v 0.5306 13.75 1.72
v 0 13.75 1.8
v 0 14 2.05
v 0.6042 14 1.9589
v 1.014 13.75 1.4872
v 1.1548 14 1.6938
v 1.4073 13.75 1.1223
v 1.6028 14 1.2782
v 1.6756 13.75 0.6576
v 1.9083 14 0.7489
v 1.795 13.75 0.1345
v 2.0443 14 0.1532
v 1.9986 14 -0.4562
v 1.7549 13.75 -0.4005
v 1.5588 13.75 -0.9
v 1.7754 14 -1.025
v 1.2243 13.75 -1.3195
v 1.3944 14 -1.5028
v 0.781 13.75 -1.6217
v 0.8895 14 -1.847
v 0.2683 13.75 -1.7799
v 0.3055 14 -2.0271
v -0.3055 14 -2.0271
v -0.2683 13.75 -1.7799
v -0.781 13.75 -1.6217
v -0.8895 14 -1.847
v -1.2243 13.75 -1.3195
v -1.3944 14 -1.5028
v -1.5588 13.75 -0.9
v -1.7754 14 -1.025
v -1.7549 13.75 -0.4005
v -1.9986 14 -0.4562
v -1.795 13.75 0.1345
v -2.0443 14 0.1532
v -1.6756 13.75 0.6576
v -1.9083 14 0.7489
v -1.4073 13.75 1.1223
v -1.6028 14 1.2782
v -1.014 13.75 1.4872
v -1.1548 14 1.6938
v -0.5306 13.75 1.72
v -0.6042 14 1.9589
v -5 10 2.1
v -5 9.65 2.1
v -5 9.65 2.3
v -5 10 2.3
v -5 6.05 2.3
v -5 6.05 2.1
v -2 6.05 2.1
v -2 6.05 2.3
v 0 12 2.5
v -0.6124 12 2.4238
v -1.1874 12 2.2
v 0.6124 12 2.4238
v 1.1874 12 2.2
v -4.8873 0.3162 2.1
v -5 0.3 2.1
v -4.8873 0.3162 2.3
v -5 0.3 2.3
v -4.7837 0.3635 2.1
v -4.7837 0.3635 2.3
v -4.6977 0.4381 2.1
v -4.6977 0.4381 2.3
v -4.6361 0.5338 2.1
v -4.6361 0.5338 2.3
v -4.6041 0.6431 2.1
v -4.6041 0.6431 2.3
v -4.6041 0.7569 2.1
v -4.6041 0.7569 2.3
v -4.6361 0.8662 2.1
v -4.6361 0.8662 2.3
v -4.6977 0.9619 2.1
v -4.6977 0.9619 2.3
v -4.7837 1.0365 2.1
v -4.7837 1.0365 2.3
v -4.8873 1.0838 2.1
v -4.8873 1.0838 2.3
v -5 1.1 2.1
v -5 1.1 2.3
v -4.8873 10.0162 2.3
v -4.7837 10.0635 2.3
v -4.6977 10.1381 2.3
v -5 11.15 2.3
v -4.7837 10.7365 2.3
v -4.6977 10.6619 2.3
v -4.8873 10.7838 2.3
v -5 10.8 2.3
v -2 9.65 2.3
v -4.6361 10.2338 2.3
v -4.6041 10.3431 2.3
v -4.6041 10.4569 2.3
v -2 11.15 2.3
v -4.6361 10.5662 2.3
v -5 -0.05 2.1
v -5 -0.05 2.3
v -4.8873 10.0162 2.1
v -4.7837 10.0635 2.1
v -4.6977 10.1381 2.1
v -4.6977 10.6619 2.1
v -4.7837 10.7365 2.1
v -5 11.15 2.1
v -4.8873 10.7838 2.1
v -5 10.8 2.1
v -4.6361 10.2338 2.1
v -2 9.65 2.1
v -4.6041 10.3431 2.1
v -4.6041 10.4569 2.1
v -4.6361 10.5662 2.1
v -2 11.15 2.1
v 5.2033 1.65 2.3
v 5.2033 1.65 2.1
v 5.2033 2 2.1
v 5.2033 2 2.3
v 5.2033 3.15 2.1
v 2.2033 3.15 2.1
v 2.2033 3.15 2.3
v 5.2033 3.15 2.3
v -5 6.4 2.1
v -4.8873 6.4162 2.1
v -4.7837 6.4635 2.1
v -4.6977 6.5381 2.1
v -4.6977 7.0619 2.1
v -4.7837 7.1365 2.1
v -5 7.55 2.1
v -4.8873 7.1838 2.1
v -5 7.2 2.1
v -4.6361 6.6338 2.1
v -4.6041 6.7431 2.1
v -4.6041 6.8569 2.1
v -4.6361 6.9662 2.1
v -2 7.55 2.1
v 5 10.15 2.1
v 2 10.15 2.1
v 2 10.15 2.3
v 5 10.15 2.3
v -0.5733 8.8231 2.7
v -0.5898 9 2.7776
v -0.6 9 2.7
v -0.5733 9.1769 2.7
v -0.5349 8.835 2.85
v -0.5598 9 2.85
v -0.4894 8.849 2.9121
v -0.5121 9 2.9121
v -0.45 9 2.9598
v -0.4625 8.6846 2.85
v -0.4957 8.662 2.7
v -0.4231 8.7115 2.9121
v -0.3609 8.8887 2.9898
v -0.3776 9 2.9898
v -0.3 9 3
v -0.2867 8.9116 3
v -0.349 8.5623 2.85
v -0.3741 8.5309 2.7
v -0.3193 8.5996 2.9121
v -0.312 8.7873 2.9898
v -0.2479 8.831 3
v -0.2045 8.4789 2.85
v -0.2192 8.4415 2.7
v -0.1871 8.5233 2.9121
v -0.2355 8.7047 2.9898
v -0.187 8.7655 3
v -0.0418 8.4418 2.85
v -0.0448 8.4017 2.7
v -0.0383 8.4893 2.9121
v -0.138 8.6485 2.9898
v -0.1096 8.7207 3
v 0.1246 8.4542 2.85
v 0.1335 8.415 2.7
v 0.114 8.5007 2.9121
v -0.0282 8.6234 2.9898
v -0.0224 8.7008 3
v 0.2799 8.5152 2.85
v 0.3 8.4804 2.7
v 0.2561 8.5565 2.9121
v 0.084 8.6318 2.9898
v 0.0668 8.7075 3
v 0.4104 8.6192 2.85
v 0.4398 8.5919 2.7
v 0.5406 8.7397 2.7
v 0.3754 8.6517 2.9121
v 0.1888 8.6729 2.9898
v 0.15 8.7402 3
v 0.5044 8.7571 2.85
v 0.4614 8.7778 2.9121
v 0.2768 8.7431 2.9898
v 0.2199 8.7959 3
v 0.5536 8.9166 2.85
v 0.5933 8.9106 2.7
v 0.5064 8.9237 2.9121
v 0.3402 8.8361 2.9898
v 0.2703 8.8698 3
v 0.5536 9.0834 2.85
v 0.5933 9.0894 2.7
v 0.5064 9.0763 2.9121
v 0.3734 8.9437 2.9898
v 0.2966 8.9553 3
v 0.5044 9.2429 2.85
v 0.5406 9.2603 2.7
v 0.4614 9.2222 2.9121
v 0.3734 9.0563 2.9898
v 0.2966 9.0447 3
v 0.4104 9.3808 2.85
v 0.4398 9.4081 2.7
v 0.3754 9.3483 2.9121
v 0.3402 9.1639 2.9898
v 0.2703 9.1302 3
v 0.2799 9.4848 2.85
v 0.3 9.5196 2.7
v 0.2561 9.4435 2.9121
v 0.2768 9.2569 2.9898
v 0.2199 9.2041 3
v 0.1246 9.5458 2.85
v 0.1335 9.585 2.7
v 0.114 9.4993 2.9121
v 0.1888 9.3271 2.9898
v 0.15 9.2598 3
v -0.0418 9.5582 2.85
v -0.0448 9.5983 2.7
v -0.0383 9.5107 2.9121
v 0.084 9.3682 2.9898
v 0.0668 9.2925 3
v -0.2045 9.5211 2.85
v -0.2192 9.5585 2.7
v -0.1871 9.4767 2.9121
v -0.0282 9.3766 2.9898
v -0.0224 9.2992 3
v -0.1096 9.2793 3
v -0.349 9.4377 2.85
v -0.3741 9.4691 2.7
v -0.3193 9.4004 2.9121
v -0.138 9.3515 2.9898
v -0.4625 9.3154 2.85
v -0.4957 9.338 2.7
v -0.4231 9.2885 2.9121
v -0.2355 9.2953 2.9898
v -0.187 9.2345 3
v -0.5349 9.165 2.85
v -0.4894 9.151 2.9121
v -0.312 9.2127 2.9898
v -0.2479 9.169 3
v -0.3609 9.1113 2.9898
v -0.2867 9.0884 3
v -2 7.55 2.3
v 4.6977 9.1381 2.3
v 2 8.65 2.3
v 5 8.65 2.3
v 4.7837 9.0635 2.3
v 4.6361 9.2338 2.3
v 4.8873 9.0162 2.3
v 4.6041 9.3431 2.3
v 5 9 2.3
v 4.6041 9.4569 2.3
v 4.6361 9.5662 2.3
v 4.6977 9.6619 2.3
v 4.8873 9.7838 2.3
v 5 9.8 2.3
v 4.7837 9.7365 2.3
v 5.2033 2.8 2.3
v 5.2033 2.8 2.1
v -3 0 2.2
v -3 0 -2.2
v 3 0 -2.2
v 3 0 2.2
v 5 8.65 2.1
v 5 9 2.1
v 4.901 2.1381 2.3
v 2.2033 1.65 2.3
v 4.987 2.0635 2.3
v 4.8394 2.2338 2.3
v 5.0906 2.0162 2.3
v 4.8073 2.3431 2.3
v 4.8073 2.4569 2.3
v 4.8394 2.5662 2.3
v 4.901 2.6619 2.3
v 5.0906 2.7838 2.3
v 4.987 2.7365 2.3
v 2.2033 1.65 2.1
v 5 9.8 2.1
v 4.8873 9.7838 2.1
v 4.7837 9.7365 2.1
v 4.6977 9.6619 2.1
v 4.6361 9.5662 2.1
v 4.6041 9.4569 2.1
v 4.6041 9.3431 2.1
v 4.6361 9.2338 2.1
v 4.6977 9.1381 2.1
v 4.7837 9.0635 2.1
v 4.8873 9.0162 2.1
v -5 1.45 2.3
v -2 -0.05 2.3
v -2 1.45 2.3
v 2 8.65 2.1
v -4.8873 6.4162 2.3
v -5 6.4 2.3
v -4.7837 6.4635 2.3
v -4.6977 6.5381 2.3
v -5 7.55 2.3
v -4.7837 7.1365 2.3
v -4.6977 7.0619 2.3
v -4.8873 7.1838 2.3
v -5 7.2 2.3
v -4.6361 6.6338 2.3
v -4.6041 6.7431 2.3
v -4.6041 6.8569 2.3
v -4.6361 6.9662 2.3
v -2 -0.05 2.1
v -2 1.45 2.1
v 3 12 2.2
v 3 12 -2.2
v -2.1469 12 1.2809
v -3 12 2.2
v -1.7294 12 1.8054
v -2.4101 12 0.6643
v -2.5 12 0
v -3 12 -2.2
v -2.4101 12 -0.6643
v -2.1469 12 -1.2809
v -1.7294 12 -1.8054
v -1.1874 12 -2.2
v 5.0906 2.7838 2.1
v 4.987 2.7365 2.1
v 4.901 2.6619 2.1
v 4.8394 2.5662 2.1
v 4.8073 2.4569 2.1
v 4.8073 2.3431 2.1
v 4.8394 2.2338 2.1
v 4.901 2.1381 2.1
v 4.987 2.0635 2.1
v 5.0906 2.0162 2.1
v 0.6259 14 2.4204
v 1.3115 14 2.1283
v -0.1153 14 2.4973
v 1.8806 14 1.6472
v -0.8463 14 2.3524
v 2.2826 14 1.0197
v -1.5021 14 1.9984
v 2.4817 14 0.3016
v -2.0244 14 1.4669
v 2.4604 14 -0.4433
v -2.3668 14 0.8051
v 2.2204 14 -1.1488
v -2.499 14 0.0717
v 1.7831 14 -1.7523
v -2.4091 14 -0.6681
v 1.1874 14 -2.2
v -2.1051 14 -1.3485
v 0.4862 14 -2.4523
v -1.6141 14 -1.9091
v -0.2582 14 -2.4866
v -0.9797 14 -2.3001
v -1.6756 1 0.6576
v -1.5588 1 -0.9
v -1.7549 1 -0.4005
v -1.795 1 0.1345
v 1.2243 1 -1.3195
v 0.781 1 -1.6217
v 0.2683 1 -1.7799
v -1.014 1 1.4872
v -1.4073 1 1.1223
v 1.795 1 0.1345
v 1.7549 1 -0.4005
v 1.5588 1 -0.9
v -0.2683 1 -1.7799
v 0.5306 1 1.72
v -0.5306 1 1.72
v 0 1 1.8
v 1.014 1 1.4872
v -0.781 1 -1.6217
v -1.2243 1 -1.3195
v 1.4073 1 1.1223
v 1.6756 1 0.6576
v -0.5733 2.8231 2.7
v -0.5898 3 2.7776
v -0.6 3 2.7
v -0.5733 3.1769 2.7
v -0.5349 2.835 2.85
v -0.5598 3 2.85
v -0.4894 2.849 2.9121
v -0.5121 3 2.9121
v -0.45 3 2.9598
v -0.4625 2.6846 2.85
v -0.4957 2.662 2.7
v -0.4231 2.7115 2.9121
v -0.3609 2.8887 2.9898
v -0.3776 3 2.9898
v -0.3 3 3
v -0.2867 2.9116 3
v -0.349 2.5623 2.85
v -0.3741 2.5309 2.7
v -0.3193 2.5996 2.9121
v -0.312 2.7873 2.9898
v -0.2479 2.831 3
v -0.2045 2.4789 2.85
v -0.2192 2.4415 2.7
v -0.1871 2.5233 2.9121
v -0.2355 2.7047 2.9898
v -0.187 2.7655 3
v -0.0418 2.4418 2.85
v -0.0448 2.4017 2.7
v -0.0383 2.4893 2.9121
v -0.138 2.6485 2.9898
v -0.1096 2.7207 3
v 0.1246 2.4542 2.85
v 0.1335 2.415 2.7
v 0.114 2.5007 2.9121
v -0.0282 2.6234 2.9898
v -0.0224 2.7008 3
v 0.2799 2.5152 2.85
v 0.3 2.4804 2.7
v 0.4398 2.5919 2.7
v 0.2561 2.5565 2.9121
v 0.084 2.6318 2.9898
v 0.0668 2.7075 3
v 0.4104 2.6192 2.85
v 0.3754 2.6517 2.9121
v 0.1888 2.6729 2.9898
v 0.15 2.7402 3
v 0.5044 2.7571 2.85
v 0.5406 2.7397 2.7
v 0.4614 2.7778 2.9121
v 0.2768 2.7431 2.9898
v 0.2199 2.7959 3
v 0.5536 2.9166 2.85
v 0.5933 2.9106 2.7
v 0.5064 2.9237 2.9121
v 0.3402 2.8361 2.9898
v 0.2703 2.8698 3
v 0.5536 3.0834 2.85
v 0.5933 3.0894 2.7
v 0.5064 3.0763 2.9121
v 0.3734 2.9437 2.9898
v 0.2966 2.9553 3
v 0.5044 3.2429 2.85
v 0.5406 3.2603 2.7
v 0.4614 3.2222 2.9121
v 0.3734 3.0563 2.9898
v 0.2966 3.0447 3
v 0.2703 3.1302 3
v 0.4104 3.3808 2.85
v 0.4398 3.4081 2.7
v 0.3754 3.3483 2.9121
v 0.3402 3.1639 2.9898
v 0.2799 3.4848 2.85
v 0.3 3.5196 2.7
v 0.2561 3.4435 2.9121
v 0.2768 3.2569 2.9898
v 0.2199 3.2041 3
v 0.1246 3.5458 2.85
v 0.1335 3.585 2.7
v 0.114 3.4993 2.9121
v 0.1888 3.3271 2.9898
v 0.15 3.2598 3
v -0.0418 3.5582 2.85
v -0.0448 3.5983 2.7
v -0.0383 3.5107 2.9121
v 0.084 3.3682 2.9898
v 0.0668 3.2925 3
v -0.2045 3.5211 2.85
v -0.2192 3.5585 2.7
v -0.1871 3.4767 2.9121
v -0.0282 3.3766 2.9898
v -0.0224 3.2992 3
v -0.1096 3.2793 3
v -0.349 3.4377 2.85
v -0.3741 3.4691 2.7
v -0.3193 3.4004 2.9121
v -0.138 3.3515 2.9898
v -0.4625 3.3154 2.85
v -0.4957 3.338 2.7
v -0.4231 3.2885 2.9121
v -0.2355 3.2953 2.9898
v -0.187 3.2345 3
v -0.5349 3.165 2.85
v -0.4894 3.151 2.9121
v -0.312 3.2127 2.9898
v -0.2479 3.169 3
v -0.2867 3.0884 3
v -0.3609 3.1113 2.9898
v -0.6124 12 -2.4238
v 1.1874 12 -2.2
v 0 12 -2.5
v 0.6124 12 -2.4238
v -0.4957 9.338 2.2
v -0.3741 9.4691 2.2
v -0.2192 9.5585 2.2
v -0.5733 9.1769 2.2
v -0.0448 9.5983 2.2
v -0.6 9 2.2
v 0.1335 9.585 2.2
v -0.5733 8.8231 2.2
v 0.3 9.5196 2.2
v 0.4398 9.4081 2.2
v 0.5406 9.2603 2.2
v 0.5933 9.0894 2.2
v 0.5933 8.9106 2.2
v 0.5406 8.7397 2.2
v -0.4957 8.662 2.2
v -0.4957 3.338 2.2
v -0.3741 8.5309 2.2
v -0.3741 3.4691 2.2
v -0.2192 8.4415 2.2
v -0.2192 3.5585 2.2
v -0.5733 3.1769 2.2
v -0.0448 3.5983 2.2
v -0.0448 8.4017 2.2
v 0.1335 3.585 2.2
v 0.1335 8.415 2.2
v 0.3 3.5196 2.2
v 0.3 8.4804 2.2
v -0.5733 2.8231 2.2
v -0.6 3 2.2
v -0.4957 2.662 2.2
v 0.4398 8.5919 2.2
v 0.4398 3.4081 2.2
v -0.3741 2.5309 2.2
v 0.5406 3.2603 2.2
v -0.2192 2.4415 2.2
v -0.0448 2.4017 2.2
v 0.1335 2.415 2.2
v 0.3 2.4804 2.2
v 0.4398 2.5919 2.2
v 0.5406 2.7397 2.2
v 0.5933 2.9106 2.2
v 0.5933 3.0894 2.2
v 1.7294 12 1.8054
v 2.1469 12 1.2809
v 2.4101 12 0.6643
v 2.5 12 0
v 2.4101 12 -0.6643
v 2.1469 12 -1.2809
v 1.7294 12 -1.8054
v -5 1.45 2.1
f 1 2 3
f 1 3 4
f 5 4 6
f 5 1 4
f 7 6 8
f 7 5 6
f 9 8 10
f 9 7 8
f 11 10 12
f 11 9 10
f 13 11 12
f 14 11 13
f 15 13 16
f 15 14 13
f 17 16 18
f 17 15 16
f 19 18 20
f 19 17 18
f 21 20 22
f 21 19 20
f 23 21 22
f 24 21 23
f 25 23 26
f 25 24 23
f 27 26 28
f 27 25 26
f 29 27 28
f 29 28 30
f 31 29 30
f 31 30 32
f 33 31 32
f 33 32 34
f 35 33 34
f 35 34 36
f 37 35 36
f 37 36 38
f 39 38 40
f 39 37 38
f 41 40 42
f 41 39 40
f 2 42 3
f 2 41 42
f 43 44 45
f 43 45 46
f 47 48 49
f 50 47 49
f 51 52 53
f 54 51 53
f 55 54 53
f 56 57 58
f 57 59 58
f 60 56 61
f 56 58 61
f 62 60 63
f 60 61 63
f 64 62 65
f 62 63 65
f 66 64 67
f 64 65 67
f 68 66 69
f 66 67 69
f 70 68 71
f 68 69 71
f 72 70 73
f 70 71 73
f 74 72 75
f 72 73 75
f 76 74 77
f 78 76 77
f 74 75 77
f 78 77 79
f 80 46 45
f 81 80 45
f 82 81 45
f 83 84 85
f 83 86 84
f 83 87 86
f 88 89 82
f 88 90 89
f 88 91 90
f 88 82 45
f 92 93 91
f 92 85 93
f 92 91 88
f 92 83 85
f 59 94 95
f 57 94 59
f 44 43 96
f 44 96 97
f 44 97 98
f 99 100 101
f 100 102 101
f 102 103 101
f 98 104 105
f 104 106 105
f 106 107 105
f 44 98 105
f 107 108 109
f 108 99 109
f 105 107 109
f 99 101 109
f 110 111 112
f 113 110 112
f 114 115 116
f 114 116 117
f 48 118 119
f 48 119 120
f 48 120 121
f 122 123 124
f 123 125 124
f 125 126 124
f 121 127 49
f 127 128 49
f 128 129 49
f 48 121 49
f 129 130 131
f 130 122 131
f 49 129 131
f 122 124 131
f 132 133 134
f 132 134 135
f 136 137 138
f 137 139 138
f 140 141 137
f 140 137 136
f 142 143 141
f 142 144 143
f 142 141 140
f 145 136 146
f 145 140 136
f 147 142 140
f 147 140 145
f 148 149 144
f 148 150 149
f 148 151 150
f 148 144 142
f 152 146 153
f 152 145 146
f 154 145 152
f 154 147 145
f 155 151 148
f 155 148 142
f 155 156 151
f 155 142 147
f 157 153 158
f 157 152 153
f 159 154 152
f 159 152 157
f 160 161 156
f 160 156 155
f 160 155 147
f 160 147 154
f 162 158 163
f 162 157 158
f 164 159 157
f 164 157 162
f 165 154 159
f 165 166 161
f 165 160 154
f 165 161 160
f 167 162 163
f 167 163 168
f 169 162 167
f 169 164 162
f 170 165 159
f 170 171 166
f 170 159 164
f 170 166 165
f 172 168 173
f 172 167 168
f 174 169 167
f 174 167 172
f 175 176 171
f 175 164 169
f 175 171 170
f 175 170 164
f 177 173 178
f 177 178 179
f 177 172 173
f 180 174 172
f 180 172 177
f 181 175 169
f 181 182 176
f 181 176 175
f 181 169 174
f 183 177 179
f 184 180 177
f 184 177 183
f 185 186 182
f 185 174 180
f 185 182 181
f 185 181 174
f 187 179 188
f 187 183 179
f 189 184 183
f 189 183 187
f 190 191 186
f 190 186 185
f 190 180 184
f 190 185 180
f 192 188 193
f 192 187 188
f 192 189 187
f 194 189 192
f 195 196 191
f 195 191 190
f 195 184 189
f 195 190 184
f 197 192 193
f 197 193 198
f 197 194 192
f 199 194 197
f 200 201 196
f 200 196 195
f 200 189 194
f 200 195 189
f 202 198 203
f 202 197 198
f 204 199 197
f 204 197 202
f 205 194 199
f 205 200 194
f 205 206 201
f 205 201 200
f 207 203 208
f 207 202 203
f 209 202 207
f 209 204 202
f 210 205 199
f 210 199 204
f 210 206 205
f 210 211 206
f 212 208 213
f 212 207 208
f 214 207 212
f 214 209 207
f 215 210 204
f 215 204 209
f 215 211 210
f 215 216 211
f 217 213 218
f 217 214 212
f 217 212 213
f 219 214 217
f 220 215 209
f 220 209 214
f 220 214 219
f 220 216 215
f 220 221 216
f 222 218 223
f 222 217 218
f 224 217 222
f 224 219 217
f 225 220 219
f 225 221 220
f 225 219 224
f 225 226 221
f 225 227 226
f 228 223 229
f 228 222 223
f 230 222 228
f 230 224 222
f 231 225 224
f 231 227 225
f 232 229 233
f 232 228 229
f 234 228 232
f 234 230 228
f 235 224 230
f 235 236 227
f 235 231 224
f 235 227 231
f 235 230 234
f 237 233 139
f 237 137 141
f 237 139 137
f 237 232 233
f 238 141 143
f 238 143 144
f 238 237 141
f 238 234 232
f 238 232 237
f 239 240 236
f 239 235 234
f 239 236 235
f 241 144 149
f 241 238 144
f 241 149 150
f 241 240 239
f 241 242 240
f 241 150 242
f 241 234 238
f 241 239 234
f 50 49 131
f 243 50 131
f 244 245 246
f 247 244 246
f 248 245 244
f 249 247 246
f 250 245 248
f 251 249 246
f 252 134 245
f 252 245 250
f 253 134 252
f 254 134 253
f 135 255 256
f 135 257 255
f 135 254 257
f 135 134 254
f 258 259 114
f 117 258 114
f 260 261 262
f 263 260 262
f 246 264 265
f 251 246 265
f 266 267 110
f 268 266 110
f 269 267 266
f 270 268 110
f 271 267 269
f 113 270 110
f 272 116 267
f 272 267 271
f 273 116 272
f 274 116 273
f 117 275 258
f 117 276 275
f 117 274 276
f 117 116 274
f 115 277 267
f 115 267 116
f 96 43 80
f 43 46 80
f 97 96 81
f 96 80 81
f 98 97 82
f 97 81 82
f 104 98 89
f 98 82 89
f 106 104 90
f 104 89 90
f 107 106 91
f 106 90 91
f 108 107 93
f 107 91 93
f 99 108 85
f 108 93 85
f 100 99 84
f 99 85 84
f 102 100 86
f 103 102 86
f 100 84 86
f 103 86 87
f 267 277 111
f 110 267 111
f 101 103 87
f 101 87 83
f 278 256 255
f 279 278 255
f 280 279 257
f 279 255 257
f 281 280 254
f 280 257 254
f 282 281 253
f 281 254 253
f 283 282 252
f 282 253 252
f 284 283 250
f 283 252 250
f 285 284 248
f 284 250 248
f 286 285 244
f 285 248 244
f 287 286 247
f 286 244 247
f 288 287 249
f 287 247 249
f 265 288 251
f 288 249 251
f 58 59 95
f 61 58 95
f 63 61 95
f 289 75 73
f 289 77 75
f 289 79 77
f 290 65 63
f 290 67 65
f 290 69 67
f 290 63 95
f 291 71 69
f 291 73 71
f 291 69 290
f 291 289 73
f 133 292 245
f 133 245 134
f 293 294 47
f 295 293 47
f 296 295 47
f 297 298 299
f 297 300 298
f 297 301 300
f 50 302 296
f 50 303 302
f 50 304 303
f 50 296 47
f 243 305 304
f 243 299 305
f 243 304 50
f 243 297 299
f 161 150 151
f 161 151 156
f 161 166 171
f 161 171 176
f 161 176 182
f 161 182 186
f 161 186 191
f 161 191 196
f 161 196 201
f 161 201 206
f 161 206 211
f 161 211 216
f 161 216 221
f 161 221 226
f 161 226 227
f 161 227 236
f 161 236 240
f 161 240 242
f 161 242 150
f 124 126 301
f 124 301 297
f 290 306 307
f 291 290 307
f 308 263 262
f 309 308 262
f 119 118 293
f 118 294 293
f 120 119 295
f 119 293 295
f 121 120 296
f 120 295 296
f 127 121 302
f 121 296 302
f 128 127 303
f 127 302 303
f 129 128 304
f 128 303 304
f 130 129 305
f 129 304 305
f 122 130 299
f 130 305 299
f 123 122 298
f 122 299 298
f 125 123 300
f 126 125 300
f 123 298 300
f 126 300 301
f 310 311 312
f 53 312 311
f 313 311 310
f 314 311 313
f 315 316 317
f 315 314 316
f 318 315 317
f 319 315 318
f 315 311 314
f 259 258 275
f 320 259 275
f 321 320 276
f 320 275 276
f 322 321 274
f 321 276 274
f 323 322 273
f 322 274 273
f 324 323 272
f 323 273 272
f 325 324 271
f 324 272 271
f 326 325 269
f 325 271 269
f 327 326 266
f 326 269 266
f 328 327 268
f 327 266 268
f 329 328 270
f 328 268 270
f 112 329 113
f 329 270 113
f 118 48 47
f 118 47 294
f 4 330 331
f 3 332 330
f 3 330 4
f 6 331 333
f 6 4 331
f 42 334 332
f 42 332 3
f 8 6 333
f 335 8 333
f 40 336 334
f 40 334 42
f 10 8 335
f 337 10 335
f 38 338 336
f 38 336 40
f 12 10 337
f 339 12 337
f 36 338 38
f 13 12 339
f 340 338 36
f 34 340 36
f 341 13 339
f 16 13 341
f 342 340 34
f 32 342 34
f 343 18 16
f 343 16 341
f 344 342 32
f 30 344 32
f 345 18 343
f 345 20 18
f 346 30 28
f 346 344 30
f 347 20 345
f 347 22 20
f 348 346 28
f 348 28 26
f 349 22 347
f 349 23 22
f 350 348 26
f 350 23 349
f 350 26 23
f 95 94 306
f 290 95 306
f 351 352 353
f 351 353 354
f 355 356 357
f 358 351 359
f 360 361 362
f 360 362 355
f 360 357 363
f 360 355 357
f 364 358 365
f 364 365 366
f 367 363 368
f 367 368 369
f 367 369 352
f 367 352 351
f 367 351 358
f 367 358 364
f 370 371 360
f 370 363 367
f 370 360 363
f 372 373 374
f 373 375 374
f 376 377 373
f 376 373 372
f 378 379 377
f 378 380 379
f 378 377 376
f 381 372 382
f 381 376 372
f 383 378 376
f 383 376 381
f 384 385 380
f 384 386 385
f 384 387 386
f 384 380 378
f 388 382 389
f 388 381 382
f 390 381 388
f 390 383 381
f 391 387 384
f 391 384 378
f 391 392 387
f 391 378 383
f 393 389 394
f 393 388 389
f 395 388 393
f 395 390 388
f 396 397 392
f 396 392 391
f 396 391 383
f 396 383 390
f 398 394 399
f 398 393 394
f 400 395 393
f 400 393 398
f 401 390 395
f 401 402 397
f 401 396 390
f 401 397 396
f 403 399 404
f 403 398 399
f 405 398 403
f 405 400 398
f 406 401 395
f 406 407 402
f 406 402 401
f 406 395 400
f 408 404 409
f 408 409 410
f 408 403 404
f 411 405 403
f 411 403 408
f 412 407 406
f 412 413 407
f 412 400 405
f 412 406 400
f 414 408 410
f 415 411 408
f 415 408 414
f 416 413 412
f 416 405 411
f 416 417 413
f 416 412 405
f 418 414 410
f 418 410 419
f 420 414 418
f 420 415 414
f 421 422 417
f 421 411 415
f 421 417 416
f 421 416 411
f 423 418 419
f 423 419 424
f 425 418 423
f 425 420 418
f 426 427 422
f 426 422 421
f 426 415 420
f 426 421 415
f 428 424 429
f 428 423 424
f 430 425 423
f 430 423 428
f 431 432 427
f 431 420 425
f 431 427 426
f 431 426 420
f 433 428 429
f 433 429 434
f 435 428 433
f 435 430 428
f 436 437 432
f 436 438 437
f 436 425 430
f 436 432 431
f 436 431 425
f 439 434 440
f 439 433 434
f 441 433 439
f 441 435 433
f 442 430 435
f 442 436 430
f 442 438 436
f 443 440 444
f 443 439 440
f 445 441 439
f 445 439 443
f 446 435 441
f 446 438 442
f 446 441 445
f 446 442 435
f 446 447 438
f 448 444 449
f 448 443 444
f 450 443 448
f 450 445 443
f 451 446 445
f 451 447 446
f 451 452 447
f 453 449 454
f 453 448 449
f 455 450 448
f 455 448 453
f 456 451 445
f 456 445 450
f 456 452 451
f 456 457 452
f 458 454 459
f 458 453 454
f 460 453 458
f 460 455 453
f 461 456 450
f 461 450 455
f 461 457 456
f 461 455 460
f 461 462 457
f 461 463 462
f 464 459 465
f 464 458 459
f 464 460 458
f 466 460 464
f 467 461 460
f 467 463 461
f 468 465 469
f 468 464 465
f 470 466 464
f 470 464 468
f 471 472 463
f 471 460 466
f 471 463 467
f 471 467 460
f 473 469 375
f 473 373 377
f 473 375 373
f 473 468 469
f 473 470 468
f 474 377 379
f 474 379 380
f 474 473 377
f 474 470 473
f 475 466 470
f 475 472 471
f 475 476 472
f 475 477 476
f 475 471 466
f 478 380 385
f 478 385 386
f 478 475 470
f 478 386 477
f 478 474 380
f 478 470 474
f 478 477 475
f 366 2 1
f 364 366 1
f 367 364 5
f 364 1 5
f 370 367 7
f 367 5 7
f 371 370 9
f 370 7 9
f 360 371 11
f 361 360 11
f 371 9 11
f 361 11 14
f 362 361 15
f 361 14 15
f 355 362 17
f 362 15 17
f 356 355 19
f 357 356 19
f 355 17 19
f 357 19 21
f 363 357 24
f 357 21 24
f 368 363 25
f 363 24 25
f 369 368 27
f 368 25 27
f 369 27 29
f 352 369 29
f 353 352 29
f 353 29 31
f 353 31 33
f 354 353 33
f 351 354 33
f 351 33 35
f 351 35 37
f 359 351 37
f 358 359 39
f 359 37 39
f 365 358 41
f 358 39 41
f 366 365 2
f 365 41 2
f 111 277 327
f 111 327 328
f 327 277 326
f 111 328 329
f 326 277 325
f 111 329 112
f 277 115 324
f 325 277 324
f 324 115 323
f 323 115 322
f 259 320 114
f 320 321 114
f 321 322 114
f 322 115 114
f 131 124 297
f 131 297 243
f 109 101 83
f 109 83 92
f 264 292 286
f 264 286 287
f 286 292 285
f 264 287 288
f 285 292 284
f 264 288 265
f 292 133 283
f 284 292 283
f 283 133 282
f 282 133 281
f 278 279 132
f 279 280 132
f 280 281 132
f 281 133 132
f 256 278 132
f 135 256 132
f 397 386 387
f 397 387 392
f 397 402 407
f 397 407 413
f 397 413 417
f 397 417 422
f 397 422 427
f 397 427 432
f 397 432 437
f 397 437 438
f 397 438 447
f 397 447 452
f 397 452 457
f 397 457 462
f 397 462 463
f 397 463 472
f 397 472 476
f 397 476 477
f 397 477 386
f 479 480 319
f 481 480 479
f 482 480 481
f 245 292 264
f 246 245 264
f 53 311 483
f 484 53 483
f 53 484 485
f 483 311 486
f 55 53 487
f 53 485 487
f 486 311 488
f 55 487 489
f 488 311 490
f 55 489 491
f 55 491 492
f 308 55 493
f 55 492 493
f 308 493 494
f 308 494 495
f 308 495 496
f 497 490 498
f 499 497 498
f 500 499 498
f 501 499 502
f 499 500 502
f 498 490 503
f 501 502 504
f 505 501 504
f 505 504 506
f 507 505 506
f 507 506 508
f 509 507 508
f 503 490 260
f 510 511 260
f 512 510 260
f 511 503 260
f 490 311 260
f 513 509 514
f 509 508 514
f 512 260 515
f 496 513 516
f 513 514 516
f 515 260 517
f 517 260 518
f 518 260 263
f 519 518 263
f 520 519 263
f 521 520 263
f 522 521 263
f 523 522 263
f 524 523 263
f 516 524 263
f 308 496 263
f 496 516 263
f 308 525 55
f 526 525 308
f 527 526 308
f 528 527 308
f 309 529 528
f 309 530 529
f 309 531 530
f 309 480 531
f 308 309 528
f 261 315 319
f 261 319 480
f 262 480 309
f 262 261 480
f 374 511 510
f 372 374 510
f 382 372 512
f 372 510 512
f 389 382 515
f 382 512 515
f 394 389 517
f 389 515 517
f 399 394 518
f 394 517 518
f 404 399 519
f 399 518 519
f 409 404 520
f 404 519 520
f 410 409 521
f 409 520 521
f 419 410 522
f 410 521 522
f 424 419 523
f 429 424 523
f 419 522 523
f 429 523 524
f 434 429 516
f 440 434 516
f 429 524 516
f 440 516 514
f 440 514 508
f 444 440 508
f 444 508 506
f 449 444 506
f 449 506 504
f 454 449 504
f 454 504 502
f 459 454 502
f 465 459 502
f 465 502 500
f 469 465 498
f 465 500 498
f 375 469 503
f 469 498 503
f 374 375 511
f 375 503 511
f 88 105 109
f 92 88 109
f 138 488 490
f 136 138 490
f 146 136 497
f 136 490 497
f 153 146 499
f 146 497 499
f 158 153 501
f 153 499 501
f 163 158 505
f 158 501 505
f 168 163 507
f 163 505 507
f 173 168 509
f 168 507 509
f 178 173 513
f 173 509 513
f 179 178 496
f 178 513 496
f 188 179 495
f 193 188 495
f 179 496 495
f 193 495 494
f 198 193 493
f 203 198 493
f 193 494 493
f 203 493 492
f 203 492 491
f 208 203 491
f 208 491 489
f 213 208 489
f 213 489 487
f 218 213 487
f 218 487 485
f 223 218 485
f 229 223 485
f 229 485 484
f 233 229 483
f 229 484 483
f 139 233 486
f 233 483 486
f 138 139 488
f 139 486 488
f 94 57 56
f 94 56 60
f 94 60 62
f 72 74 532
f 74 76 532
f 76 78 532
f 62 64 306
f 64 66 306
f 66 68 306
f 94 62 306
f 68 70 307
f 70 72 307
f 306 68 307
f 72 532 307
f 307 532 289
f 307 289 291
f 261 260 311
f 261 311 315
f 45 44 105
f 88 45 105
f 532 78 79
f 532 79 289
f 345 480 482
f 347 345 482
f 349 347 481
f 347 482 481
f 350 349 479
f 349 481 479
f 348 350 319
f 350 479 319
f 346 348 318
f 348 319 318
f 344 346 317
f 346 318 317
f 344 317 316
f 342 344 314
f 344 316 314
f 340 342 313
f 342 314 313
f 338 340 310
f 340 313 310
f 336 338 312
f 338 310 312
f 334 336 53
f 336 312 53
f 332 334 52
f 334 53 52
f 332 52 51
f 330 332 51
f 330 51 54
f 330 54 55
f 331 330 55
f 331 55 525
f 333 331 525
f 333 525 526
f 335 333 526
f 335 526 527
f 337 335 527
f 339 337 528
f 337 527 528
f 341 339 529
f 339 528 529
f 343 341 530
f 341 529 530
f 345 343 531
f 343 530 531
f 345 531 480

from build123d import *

# Parameters (mm, degrees)
SKETCH_1_W             = 6
SKETCH_1_H             = 4.4
EXTRUDE_1_DEPTH        = 12
SKETCH_2_R             = 2.5
EXTRUDE_2_DEPTH        = 2
SKETCH_3_R             = 1.8
CUT_EXTRUDE_1_DEPTH    = 13
EXTRUDE_3_DEPTH        = 0.1
EXTRUDE_3_DEPTH_BACK   = 0.1
SKETCH_5_W             = 3
SKETCH_5_H             = 1.5
EXTRUDE_3_2_DEPTH      = 0.1
EXTRUDE_3_2_DEPTH_BACK = 0.1
EXTRUDE_3_3_DEPTH      = 0.1
EXTRUDE_3_3_DEPTH_BACK = 0.1
EXTRUDE_3_4_DEPTH      = 0.1
EXTRUDE_3_4_DEPTH_BACK = 0.1
EXTRUDE_3_5_DEPTH      = 0.1
EXTRUDE_3_5_DEPTH_BACK = 0.1
SKETCH_6_R             = 0.4
CUT_EXTRUDE_2_DEPTH    = 0.2
CHAMFER_1_SIZE         = 0.25
SKETCH_7_R             = 0.6
EXTRUDE_4_DEPTH        = 0.8
FILLET_1_R             = 0.3


with BuildPart() as part:
    # 草图1 → 凸台-拉伸1 (new body)
    with BuildSketch(Plane(origin=(0, 0, 0), x_dir=(1, 0, 0), z_dir=(0, 1, 0))):
        Rectangle(SKETCH_1_W, SKETCH_1_H)
    extrude(amount=EXTRUDE_1_DEPTH)

    # 草图2 → 凸台-拉伸2 (add)
    with BuildSketch(Plane(origin=(0, 12, 0), x_dir=(1, 0, 0), z_dir=(0, 1, 0))):
        with Locations(Location((0, 0, 0), (0, 0, 61.642363424))):
            Circle(SKETCH_2_R)
    extrude(amount=EXTRUDE_2_DEPTH)

    # 草图3 → 切除-拉伸1 (cut)
    with BuildSketch(Plane(origin=(0, 14, 0), x_dir=(1, 0, 0), z_dir=(0, 1, 0))):
        with Locations(Location((0, 0, 0), (0, 0, 270))):
            Circle(SKETCH_3_R)
    extrude(amount=-CUT_EXTRUDE_1_DEPTH, mode=Mode.SUBTRACT)

    # 倒角1
    chamfer_1_edges = [part.edges().sort_by_distance(p)[0] for p in [
        (0, 14, -1.8),
    ]]
    chamfer(chamfer_1_edges, length=CHAMFER_1_SIZE)

    # 草图7 → 凸台-拉伸4 (add)
    with BuildSketch(Plane.XY.offset(2.2)):
        with Locations(Location((0, 9, 0), (0, 0, 180))):
            Circle(SKETCH_7_R)
        with Locations(Location((0, 3, 0), (0, 0, 180))):
            Circle(SKETCH_7_R)
    extrude(amount=EXTRUDE_4_DEPTH)

    # 圆角1
    fillet_1_edges = [part.edges().sort_by_distance(p)[0] for p in [
        (0.6, 9, 3),
        (0.6, 3, 3),
    ]]
    fillet(fillet_1_edges, radius=FILLET_1_R)


with BuildPart() as body_2:
    # 草图5 → 凸台-拉伸3 (new, two sides: drawn at the far end of the back side and taken through both)
    with BuildSketch(Plane.XY.offset(2.2).offset(-EXTRUDE_3_DEPTH_BACK)):
        with Locations((-3.5, 10.4)):
            Rectangle(SKETCH_5_W, SKETCH_5_H)
    extrude(amount=EXTRUDE_3_DEPTH + EXTRUDE_3_DEPTH_BACK)


with BuildPart() as body_3:
    # 草图5 → Extrude 3 2 (new, two sides: drawn at the far end of the back side and taken through both)
    with BuildSketch(Plane.XY.offset(2.2).offset(-EXTRUDE_3_2_DEPTH_BACK)):
        with Locations((-3.5, 6.8)):
            Rectangle(SKETCH_5_W, SKETCH_5_H)
    extrude(amount=EXTRUDE_3_2_DEPTH + EXTRUDE_3_2_DEPTH_BACK)


with BuildPart() as body_4:
    # 草图5 → Extrude 3 3 (new, two sides: drawn at the far end of the back side and taken through both)
    with BuildSketch(Plane.XY.offset(2.2).offset(-EXTRUDE_3_3_DEPTH_BACK)):
        with Locations((-3.5, 0.7)):
            Rectangle(SKETCH_5_W, SKETCH_5_H)
    extrude(amount=EXTRUDE_3_3_DEPTH + EXTRUDE_3_3_DEPTH_BACK)


with BuildPart() as body_5:
    # 草图5 → Extrude 3 4 (new, two sides: drawn at the far end of the back side and taken through both)
    with BuildSketch(Plane.XY.offset(2.2).offset(-EXTRUDE_3_4_DEPTH_BACK)):
        with Locations((3.5, 9.4)):
            Rectangle(SKETCH_5_W, SKETCH_5_H)
    extrude(amount=EXTRUDE_3_4_DEPTH + EXTRUDE_3_4_DEPTH_BACK)


with BuildPart() as body_6:
    # 草图5 → Extrude 3 5 (new, two sides: drawn at the far end of the back side and taken through both)
    with BuildSketch(Plane.XY.offset(2.2).offset(-EXTRUDE_3_5_DEPTH_BACK)):
        with Locations((3.703252842, 2.4)):
            Rectangle(SKETCH_5_W, SKETCH_5_H)
    extrude(amount=EXTRUDE_3_5_DEPTH + EXTRUDE_3_5_DEPTH_BACK)


with BuildPart() as cut_extrude_2_tool:
    # 草图6 → 切除-拉伸2 (new body)
    with BuildSketch(Plane.XY.offset(2.3)):
        with Locations((-5, 10.4)):
            Circle(SKETCH_6_R)
        with Locations((-5, 6.8)):
            Circle(SKETCH_6_R)
        with Locations((5, 9.4)):
            Circle(SKETCH_6_R)
        with Locations((5.203252842, 2.4)):
            Circle(SKETCH_6_R)
        with Locations((-5, 0.7)):
            Circle(SKETCH_6_R)
    extrude(amount=-CUT_EXTRUDE_2_DEPTH)


with BuildPart() as body_2_1:
    add(body_2.part)

    # 切除-拉伸2: cut by cut_extrude_2_tool
    add(cut_extrude_2_tool.part, mode=Mode.SUBTRACT)


with BuildPart() as body_3_1:
    add(body_3.part)

    # 切除-拉伸2: cut by cut_extrude_2_tool
    add(cut_extrude_2_tool.part, mode=Mode.SUBTRACT)


with BuildPart() as body_4_1:
    add(body_4.part)

    # 切除-拉伸2: cut by cut_extrude_2_tool
    add(cut_extrude_2_tool.part, mode=Mode.SUBTRACT)


with BuildPart() as body_5_1:
    add(body_5.part)

    # 切除-拉伸2: cut by cut_extrude_2_tool
    add(cut_extrude_2_tool.part, mode=Mode.SUBTRACT)


with BuildPart() as body_6_1:
    add(body_6.part)

    # 切除-拉伸2: cut by cut_extrude_2_tool
    add(cut_extrude_2_tool.part, mode=Mode.SUBTRACT)


solid = Compound([part.part, body_2_1.part, body_3_1.part, body_4_1.part, body_5_1.part, body_6_1.part])
